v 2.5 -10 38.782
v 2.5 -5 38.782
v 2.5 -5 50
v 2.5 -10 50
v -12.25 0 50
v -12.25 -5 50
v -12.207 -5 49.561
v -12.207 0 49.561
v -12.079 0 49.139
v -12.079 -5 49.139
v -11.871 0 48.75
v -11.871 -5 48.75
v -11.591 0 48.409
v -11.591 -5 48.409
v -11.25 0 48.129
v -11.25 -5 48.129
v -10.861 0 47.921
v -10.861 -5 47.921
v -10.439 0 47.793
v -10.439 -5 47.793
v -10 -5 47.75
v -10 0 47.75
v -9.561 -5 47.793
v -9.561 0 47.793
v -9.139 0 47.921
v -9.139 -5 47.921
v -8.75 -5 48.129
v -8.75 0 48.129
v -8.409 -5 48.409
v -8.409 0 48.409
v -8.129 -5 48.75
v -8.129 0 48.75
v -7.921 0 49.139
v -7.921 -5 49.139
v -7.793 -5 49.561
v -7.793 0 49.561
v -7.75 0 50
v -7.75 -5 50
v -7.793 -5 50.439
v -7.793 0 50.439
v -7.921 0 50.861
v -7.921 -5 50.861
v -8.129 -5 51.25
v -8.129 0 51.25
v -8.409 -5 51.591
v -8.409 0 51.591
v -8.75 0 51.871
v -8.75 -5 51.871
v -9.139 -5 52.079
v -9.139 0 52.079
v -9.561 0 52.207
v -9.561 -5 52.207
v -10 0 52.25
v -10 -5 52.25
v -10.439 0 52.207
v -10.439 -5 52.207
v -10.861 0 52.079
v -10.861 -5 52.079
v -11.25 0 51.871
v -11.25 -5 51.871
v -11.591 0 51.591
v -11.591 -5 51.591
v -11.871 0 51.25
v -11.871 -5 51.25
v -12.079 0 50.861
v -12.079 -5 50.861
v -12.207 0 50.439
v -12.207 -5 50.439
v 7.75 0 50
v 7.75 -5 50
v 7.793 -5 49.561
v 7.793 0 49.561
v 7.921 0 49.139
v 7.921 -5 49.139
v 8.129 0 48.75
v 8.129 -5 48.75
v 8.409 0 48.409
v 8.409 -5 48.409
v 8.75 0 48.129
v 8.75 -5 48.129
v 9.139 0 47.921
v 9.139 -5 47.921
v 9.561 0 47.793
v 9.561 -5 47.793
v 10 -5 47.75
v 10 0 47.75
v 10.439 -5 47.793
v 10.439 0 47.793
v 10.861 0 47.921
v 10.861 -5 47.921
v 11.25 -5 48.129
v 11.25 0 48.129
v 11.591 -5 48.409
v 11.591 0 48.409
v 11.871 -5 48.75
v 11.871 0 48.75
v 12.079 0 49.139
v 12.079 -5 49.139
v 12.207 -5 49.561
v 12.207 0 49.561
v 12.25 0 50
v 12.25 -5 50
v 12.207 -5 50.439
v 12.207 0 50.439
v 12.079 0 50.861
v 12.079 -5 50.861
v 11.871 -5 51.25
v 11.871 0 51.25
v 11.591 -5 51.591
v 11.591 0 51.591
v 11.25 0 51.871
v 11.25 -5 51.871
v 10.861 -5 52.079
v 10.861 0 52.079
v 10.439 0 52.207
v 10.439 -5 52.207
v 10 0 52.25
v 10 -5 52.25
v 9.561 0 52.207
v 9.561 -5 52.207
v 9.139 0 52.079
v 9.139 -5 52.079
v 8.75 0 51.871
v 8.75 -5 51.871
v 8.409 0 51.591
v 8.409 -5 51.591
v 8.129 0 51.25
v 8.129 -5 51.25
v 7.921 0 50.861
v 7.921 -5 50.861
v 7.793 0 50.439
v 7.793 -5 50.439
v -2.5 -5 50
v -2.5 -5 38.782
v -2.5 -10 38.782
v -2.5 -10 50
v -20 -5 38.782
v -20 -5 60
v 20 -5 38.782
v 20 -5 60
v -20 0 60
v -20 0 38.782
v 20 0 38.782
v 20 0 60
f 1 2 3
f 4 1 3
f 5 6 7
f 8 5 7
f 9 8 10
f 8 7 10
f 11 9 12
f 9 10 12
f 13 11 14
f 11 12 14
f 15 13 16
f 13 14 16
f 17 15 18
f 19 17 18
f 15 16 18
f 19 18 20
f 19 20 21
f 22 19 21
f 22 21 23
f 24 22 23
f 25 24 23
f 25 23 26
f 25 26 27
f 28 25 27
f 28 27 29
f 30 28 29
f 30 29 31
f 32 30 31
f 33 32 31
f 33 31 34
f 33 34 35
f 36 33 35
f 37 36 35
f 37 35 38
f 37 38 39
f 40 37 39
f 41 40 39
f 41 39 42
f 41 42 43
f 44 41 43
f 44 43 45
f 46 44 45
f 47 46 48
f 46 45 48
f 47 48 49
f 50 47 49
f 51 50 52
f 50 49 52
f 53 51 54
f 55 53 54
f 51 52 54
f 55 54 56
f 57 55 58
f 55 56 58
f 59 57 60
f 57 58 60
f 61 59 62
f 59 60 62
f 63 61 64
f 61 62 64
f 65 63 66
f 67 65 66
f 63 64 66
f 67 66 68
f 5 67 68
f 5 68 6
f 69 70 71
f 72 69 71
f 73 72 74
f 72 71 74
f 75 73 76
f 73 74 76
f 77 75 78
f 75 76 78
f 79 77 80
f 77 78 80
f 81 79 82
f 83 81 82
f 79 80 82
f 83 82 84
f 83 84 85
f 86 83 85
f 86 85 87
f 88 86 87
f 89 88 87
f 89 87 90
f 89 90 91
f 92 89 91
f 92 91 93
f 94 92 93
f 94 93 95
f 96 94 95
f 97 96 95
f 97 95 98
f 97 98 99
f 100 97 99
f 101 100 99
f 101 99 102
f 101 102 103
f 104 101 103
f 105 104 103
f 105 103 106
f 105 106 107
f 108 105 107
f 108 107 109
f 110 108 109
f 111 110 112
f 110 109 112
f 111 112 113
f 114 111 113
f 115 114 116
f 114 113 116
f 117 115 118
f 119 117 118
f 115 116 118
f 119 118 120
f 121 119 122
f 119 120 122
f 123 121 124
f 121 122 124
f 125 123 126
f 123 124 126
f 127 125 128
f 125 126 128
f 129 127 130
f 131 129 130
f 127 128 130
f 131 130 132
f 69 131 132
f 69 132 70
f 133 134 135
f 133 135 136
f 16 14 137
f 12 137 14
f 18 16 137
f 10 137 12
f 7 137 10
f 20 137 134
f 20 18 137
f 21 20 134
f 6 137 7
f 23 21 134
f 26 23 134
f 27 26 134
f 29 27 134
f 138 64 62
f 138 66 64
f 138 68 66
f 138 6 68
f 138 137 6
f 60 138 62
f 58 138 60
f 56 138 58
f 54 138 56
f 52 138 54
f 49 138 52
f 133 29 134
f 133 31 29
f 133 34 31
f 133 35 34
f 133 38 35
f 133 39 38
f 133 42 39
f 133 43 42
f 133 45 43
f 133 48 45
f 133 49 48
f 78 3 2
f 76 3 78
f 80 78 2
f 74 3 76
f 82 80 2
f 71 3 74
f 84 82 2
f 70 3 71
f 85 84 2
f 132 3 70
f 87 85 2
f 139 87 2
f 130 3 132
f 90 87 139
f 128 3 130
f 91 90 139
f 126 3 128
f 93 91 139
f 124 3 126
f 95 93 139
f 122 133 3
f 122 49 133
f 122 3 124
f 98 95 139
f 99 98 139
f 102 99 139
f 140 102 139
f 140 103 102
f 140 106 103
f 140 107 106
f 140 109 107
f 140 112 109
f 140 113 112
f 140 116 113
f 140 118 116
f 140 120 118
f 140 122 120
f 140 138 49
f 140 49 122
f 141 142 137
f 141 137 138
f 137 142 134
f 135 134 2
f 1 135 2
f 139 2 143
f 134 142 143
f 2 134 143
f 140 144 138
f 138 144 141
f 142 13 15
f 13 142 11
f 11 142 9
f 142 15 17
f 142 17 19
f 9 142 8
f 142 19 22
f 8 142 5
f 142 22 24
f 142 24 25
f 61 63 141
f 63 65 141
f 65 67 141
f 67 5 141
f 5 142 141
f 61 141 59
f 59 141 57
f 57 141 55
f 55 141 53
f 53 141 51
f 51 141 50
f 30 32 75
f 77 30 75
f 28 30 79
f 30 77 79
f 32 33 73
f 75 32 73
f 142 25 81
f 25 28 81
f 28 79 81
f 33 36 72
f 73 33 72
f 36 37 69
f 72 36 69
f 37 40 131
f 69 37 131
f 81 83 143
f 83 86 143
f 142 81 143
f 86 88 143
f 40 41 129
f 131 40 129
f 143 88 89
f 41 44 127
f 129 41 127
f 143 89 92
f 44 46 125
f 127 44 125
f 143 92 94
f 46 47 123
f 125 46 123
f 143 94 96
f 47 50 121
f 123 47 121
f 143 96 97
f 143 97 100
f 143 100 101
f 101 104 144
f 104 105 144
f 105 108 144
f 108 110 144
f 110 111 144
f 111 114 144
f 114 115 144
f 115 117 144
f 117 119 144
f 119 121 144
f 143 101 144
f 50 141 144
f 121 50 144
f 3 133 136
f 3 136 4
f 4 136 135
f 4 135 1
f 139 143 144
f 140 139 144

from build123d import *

# Parameters (mm, degrees)
F0_W     = 17.5
F0_H     = 21.2181335688
F0_W_2   = 5
F1_DEPTH = 5
F2_W     = 5
F2_H     = 11.2181335688
F3_DEPTH = 5
F4_D     = 4.5
F4_DEPTH = 17
F4_TIP   = 1.3519363928


with BuildPart() as f1:
    # F0 (on Front) → F1 (new body)
    with BuildSketch(Plane.XZ):
        with Locations((-11.25, 49.3909332156)):
            Rectangle(F0_W, F0_H)
        with Locations((0, 49.3909332156)):
            Rectangle(F0_W_2, F0_H)
        with Locations((11.25, 49.3909332156)):
            Rectangle(F0_W, F0_H)
    extrude(amount=F1_DEPTH)

    # F2 (on face) → F3 (join)
    with BuildSketch(Plane.XZ.offset(5)):
        with Locations((0, 44.3909332156)):
            Rectangle(F2_W, F2_H)
    extrude(amount=F3_DEPTH)

    # F4
    with Locations(Plane(origin=(0, 0, 0), x_dir=(1, 0, 0), z_dir=(0, 1, 0))):
        with Locations((10, -50), (-10, -50)):
            Hole(F4_D / 2, depth=F4_DEPTH)
            with Locations((0, 0, -(F4_DEPTH + F4_TIP / 2))):  # 118° drill point
                Cone(0, F4_D / 2, F4_TIP, mode=Mode.SUBTRACT)


solid = f1.part
